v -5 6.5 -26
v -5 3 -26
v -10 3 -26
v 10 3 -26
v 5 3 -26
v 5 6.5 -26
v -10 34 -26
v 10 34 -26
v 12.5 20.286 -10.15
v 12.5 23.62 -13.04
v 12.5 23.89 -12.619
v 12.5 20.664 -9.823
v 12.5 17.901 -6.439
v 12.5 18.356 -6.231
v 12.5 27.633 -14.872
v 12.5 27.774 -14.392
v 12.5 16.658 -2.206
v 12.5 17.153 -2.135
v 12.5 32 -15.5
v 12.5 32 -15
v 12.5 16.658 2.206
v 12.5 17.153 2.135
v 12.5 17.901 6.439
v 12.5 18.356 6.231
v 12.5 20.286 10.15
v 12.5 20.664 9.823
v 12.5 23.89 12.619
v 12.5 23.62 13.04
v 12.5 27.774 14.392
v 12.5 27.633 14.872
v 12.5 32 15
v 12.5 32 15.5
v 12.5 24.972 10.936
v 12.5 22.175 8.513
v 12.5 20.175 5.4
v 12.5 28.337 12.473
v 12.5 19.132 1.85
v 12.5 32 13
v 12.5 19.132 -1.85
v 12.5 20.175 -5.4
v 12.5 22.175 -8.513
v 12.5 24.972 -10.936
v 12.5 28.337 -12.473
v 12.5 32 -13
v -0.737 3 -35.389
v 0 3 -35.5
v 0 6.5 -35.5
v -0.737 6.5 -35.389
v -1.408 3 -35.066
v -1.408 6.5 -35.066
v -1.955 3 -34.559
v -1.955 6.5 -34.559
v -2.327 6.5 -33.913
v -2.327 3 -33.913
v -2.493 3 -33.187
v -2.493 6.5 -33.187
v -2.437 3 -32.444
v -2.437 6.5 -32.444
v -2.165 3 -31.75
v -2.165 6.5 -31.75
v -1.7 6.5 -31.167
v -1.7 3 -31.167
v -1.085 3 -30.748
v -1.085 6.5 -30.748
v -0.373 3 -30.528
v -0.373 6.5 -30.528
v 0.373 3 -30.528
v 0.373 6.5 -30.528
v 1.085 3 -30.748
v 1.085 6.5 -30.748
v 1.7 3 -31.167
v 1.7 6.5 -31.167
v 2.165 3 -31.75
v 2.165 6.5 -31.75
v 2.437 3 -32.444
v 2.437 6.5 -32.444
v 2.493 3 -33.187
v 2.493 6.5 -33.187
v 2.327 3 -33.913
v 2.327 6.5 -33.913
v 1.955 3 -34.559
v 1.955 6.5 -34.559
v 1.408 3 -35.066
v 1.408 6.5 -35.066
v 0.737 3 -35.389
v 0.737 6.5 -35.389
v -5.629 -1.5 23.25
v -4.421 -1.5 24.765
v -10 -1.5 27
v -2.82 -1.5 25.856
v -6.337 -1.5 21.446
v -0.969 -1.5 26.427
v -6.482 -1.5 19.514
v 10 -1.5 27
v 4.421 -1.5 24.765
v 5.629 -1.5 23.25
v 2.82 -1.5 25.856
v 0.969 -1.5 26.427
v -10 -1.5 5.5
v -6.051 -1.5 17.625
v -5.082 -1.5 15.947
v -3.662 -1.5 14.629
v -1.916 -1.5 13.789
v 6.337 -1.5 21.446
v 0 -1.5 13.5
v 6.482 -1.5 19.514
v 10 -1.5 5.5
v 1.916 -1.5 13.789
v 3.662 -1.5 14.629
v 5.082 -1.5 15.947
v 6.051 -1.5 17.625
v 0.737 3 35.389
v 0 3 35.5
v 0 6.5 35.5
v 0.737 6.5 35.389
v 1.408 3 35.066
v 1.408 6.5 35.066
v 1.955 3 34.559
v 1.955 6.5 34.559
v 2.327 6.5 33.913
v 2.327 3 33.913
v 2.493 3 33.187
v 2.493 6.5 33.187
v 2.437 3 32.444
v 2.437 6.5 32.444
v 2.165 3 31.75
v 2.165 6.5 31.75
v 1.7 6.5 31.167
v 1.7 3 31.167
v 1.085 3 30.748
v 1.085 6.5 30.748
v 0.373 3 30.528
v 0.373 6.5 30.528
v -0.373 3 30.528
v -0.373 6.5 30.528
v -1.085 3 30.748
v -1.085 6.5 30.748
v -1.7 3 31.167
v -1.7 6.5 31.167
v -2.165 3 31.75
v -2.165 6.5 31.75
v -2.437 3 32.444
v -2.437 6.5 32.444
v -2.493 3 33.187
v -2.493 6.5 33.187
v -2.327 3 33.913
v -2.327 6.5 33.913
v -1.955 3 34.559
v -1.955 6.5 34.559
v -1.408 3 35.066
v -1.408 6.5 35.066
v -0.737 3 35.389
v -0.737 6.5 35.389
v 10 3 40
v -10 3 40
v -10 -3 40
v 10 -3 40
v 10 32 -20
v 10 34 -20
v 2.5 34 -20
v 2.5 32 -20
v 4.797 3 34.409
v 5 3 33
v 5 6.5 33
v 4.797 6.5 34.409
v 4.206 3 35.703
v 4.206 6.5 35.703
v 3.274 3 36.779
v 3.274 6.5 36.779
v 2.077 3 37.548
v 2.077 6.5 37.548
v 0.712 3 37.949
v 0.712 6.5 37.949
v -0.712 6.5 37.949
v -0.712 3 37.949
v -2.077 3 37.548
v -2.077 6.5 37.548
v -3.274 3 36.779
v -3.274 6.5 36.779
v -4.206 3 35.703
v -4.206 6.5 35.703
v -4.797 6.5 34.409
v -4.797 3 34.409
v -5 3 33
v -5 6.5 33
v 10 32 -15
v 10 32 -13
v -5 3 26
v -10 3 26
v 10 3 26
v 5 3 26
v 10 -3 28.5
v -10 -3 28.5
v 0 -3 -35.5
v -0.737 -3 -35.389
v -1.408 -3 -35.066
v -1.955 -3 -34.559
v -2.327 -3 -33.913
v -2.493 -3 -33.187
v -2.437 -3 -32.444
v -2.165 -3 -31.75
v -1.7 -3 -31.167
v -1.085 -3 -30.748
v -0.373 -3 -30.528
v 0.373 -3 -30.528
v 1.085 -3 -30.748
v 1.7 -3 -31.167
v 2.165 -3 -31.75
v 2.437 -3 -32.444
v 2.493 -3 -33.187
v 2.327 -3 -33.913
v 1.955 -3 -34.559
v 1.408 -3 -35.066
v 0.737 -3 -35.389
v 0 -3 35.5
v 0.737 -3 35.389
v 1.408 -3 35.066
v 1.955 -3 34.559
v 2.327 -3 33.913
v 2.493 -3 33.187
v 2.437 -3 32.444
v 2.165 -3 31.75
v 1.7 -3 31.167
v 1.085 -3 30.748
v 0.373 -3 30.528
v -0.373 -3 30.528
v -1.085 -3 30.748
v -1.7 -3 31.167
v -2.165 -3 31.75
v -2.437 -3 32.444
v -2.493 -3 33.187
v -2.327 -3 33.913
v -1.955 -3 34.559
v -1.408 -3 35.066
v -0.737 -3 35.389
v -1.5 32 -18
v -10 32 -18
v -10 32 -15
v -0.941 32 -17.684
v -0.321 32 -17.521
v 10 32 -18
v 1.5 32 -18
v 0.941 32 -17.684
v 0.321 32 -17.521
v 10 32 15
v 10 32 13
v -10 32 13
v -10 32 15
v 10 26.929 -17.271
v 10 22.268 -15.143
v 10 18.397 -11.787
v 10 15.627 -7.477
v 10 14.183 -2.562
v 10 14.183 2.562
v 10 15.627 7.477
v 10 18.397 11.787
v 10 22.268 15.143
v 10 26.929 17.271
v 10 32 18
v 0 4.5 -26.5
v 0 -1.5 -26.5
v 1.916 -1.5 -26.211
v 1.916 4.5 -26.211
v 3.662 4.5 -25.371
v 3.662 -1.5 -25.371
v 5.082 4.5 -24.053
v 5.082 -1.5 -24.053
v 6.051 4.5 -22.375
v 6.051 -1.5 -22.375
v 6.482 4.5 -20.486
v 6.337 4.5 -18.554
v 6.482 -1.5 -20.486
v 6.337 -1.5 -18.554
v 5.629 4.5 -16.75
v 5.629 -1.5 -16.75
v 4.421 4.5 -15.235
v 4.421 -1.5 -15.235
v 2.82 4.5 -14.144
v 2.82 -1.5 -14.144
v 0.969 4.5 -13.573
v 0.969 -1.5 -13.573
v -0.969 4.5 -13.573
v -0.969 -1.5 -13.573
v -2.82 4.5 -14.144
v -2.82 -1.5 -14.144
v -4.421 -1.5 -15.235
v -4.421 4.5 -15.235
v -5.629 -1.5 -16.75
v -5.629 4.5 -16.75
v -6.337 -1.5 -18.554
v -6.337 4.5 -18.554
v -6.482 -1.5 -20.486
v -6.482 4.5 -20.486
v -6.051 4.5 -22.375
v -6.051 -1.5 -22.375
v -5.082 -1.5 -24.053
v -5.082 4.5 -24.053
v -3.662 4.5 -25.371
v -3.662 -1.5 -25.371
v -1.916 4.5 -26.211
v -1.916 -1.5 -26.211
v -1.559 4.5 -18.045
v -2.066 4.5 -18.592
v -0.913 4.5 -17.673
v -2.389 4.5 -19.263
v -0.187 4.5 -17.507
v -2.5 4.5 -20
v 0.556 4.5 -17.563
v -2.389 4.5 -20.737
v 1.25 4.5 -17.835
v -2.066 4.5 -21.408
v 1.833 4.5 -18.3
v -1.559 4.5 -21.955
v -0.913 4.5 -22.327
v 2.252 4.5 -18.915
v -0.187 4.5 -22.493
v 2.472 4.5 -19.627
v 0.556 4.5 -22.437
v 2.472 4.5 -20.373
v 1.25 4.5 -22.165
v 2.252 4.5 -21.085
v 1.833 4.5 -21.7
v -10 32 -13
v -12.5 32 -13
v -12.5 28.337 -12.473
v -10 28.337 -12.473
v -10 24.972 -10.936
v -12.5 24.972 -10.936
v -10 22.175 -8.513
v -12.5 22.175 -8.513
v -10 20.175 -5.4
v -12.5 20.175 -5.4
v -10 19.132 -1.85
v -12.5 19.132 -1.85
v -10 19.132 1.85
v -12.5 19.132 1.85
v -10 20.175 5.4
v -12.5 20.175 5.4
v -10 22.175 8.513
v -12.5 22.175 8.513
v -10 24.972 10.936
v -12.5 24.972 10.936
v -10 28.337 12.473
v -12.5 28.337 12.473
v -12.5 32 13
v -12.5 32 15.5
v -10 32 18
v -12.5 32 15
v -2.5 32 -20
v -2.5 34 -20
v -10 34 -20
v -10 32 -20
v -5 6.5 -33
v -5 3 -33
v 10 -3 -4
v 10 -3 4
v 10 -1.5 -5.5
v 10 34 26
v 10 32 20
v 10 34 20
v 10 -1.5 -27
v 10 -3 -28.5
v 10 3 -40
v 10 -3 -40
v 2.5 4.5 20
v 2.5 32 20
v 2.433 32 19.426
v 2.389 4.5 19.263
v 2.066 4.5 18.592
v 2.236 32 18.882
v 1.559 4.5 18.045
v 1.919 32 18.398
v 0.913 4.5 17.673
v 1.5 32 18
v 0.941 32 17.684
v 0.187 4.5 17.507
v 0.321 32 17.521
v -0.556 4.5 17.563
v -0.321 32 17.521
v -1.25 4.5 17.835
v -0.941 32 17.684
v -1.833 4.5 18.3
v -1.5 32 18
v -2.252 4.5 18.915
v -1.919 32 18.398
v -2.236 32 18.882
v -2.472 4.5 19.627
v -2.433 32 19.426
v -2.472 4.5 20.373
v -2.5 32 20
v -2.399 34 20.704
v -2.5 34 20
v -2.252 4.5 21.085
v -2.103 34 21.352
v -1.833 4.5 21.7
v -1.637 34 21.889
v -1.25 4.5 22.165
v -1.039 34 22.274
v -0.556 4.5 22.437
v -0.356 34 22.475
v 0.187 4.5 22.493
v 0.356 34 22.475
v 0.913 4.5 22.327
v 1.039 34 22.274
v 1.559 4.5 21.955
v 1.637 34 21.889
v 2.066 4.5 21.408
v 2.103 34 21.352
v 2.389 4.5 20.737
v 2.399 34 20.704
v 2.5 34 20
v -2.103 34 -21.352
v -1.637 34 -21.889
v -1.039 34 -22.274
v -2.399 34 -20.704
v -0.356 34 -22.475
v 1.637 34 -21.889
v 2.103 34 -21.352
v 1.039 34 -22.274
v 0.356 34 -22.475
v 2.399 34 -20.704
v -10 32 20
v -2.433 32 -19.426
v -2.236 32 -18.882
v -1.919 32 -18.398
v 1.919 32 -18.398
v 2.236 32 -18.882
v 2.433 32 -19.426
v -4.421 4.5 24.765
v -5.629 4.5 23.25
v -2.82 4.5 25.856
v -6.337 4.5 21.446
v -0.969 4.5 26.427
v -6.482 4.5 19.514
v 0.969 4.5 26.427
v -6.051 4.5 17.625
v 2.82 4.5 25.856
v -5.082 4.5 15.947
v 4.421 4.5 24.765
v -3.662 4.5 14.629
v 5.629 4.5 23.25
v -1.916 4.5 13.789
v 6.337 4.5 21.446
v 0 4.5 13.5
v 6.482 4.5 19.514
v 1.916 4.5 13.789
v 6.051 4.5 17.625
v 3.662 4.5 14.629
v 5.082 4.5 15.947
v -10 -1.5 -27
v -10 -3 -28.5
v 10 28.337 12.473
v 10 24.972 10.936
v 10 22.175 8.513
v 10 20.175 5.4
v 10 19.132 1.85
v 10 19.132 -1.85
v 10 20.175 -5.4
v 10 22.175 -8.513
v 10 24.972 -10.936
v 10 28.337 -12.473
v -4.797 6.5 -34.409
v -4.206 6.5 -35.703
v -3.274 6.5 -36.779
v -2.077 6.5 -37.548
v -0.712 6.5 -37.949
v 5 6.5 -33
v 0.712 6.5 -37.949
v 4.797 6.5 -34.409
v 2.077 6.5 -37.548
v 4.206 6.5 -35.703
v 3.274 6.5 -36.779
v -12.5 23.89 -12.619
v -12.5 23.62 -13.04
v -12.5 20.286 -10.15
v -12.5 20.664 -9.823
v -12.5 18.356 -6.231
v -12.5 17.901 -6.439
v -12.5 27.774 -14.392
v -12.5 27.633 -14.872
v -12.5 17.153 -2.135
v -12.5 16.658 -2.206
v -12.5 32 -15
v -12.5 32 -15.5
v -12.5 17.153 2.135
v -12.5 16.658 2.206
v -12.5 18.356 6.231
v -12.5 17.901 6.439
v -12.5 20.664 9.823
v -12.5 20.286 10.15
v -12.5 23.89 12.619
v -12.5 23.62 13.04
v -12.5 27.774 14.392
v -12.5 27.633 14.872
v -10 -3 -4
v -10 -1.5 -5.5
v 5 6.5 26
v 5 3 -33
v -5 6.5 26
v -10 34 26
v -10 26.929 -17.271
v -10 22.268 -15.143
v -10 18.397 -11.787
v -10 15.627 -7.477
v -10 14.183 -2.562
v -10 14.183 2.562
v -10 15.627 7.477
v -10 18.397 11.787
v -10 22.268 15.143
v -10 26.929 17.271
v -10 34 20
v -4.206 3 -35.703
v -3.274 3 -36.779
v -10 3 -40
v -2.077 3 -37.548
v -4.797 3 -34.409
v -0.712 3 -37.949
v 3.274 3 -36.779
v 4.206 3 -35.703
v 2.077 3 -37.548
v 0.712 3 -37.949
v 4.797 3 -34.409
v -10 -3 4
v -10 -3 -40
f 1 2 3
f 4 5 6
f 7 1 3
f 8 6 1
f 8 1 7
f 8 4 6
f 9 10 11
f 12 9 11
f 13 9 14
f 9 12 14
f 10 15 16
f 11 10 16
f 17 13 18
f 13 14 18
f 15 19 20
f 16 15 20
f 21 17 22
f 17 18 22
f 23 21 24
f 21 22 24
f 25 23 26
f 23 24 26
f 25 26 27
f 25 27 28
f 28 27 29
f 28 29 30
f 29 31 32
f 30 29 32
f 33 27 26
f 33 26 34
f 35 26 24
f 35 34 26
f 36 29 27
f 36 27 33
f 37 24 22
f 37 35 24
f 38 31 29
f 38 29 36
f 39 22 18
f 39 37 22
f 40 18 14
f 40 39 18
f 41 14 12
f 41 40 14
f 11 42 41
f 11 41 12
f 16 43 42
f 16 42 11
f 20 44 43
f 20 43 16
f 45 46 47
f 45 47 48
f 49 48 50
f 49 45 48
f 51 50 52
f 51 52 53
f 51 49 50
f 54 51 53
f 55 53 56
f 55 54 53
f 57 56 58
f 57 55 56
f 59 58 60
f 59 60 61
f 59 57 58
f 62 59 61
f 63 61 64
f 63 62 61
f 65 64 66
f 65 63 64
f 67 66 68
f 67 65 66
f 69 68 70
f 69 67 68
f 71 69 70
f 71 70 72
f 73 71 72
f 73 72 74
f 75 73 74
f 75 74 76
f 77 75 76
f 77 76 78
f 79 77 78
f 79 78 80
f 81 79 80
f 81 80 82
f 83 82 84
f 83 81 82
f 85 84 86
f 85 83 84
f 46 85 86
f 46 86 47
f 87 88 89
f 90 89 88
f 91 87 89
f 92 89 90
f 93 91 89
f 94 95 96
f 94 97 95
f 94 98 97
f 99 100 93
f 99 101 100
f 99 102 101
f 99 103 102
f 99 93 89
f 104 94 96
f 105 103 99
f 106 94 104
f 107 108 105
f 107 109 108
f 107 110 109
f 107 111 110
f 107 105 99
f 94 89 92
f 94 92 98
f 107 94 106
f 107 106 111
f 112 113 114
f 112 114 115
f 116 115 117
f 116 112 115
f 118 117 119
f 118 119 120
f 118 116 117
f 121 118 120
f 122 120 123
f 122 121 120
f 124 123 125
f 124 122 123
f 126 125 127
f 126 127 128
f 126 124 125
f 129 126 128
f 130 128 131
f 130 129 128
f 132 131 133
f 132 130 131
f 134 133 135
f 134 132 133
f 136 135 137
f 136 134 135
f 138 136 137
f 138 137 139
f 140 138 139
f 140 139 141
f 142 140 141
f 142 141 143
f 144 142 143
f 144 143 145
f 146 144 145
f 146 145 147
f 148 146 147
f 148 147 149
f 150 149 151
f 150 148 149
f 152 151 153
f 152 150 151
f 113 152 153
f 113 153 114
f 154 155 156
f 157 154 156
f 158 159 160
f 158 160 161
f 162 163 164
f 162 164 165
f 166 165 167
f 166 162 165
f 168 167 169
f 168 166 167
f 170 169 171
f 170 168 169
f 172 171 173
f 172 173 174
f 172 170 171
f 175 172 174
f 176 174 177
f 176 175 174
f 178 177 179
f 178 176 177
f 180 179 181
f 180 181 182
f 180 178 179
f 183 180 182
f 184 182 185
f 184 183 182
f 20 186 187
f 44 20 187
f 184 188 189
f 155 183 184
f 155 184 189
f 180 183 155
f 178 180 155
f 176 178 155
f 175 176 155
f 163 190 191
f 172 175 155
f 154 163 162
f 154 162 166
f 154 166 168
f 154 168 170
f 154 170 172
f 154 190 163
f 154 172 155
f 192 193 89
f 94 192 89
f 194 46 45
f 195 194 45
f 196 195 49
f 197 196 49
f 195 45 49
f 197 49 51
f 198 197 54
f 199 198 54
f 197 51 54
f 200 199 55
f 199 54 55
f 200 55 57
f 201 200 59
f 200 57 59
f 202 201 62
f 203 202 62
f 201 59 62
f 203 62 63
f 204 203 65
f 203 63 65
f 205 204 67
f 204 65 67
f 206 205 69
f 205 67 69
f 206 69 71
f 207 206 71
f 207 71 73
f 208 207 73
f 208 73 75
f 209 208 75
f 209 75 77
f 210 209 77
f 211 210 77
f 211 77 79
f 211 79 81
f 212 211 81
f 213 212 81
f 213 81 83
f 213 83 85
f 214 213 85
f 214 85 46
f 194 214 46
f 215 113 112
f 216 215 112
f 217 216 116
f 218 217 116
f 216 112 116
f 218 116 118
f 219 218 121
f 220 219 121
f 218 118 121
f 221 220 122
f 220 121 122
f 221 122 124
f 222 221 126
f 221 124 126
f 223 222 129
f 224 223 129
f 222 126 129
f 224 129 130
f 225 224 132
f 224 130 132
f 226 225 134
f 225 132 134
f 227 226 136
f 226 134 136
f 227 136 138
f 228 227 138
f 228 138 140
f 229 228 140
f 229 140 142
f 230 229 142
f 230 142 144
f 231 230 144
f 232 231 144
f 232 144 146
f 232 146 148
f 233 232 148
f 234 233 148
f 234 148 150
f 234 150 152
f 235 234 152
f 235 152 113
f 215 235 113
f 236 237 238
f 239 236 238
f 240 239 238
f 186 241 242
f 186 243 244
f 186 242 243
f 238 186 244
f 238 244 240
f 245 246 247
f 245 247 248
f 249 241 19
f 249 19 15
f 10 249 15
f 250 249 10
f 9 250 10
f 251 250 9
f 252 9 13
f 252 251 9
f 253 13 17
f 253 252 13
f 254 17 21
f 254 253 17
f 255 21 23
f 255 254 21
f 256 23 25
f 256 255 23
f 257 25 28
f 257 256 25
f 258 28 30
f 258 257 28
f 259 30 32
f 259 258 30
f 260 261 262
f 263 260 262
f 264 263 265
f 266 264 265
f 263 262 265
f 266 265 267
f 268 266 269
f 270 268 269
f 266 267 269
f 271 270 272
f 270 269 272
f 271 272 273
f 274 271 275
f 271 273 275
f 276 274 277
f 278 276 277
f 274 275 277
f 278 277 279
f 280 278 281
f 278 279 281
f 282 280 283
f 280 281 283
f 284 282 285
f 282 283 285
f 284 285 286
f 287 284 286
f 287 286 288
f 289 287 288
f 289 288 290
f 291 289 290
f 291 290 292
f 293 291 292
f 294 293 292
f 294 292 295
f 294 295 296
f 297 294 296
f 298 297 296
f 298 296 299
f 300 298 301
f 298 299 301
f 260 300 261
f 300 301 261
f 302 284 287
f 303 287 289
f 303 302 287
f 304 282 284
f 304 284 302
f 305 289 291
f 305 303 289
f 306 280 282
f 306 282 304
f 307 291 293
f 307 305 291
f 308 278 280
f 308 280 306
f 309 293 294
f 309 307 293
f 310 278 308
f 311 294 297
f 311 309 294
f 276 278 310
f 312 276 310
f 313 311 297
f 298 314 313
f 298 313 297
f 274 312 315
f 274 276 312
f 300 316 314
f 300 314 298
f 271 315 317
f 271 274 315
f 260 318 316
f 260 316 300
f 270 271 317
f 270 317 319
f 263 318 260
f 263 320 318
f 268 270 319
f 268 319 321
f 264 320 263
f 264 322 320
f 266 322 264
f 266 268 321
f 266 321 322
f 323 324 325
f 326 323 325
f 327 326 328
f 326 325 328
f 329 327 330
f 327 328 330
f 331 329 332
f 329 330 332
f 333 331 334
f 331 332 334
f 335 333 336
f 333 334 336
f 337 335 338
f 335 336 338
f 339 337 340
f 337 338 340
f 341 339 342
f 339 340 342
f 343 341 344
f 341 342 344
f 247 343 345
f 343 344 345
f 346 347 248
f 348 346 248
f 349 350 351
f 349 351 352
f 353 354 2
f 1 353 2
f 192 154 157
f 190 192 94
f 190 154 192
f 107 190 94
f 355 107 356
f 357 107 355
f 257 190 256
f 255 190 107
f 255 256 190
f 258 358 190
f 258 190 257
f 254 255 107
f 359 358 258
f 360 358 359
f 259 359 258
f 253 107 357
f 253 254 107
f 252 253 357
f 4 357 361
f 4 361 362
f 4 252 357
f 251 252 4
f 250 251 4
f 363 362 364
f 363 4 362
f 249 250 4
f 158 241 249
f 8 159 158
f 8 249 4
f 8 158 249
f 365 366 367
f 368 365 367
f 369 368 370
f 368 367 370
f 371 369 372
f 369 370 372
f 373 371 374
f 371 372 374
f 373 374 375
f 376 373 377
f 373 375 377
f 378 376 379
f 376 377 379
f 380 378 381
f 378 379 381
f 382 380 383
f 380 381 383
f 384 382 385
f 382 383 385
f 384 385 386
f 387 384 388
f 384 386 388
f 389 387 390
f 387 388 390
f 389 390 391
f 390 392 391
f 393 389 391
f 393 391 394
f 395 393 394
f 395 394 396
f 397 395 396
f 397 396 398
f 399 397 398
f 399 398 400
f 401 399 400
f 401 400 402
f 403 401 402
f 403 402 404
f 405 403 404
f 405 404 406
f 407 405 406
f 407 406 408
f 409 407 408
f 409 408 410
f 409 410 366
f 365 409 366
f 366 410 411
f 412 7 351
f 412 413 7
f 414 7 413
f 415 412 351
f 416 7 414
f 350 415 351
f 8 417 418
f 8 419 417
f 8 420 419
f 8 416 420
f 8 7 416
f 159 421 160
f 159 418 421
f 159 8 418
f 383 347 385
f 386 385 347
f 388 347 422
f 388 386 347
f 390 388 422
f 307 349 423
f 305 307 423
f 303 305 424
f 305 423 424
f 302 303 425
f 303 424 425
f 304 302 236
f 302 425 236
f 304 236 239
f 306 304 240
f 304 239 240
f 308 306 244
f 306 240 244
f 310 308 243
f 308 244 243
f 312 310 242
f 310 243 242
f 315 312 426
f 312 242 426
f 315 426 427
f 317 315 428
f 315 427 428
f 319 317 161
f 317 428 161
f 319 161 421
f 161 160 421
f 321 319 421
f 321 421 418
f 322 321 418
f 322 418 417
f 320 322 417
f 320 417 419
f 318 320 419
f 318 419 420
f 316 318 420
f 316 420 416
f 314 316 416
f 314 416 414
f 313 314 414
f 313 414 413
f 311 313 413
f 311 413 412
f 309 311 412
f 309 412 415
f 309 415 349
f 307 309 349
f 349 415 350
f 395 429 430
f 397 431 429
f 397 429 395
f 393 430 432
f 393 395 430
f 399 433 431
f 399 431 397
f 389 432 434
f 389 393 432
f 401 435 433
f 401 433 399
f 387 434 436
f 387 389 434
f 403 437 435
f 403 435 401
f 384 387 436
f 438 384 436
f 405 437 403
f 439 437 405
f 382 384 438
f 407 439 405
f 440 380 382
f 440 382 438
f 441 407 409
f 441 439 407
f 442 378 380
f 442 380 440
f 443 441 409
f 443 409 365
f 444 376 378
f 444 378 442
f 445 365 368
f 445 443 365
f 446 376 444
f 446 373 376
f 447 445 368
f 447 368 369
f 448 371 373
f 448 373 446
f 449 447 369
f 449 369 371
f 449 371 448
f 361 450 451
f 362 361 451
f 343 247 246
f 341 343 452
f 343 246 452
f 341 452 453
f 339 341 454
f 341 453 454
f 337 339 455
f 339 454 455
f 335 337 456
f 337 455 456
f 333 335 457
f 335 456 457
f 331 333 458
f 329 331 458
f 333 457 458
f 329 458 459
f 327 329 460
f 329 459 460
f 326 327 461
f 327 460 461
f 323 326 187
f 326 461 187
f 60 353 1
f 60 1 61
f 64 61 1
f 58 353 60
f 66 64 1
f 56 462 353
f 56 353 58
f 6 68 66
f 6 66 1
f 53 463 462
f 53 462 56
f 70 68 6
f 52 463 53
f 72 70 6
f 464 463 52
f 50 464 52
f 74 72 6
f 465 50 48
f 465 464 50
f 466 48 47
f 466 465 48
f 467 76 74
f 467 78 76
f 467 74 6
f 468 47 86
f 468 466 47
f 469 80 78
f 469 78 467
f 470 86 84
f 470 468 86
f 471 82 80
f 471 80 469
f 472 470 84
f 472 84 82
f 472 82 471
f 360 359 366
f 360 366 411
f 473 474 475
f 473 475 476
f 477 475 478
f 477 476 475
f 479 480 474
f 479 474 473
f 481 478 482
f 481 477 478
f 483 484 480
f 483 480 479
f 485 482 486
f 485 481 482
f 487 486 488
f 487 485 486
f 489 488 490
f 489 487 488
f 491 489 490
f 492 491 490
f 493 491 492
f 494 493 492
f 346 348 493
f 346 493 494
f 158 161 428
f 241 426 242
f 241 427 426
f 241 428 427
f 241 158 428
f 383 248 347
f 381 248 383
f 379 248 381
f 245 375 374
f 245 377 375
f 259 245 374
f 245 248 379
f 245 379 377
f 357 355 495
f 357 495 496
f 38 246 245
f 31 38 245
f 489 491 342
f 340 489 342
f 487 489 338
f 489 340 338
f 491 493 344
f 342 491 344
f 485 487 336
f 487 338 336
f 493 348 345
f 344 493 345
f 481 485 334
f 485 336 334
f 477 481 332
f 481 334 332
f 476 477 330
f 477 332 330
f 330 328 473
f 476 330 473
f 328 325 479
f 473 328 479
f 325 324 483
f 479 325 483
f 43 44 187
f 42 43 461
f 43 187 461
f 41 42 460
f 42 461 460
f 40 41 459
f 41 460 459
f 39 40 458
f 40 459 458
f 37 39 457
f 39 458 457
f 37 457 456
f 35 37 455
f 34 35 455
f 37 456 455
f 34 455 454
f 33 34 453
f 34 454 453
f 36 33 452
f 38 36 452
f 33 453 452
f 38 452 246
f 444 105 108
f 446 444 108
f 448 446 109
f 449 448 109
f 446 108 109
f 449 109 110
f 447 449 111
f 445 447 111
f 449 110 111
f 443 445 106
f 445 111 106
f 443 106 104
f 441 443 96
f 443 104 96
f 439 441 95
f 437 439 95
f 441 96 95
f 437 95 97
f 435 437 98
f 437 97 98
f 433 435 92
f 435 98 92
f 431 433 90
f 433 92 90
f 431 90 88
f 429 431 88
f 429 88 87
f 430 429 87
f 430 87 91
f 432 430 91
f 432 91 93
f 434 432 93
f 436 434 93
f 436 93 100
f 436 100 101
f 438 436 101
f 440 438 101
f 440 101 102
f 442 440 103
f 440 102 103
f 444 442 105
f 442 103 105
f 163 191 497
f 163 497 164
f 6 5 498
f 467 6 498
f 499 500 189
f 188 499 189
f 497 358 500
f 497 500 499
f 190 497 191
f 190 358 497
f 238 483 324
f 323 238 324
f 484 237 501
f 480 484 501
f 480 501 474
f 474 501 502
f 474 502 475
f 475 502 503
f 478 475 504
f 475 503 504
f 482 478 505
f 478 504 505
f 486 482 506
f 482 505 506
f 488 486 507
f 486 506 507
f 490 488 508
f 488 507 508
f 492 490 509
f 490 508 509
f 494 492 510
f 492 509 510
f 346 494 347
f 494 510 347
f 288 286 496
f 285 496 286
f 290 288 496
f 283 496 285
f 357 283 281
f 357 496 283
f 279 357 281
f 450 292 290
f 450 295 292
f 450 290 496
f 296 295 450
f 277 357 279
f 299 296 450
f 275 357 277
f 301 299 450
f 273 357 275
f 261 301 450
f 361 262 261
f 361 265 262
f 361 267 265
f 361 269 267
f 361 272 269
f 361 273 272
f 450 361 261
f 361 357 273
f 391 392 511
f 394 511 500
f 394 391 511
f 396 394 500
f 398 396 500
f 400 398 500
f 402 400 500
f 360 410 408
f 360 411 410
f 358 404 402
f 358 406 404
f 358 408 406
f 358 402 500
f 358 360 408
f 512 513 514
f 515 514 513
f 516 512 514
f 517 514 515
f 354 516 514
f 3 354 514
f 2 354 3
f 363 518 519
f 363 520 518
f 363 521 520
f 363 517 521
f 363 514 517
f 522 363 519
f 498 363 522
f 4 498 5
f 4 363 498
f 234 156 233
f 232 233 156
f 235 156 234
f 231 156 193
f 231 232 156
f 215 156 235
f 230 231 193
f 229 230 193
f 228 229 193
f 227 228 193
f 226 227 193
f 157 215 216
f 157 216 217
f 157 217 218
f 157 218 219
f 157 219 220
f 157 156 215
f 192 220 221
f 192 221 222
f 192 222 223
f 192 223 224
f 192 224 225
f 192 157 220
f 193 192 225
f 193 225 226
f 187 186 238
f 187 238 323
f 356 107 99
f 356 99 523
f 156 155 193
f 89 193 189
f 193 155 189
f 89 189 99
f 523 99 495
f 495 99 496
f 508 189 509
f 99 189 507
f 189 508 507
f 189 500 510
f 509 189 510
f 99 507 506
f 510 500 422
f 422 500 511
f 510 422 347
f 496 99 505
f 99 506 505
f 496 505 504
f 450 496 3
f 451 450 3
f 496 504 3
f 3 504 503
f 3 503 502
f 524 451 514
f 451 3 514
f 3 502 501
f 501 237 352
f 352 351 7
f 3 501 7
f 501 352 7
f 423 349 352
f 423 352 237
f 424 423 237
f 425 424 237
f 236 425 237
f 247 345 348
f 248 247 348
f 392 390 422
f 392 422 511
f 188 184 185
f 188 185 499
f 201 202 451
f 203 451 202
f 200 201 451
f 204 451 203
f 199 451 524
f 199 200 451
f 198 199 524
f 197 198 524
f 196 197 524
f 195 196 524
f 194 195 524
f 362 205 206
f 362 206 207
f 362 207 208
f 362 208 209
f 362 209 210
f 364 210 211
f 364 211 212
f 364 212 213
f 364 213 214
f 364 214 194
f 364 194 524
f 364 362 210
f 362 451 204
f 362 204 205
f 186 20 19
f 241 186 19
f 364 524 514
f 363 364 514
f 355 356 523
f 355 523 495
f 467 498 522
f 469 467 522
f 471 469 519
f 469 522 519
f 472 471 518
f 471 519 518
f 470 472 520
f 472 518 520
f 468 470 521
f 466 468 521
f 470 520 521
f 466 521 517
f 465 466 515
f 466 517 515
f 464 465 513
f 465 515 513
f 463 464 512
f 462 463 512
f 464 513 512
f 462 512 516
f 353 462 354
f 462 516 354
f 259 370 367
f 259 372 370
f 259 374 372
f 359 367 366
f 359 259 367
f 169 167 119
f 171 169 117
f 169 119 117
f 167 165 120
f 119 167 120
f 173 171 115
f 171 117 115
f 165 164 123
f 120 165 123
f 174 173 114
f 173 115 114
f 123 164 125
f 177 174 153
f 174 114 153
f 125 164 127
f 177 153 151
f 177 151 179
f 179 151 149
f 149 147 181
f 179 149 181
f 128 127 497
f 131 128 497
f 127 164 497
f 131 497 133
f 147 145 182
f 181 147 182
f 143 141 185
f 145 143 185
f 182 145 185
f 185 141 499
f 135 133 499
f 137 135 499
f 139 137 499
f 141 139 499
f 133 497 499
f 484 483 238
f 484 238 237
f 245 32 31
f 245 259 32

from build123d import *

# Parameters (mm, degrees)
BOSS_EXTRUDE1_DEPTH      = 10
BOSS_EXTRUDE2_DEPTH      = 20
SKETCH3_R                = 2.5
BOSS_EXTRUDE4_DEPTH      = 3.5
SKETCH5_R                = 2.5
CUT_EXTRUDE2_DEPTH       = 52.584881506
SKETCH6_R                = 13
CUT_EXTRUDE3_DEPTH       = 57.178287621
BOSS_EXTRUDE5_DEPTH      = 2.5
BOSS_EXTRUDE5_DEPTH_BACK = 22.5
SKETCH14_R               = 6.5
CUT_EXTRUDE6_DEPTH       = 6
BOSS_EXTRUDE6_DEPTH      = 2.5
BOSS_EXTRUDE6_DEPTH_BACK = 22.5
CHAMFER1_SIZE            = 2.5
SKETCH15_R               = 2.5
CUT_EXTRUDE7_DEPTH       = 30


with BuildPart() as part:
    # Sketch1 → Boss-Extrude1 (new, symmetric)
    with BuildSketch(Plane(origin=(0, 0, 0), x_dir=(0, 0, -1), z_dir=(1, 0, 0))):
        Polygon((-40, -3), (-28.5, -3), (-27, -1.5), (-5.5, -1.5), (-4, -3), (4, -3), (5.5, -1.5), (27, -1.5), (28.5, -3), (40, -3), (40, 3), (-40, 3), align=None)
    extrude(amount=BOSS_EXTRUDE1_DEPTH, both=True)

    # Sketch2 → Boss-Extrude2 (add)
    with BuildSketch(Plane(origin=(10, 0, 0), x_dir=(0, 0, -1), z_dir=(1, 0, 0))):
        Polygon((20, 32), (13, 32), (-13, 32), (-20, 32), (-20, 34), (-26, 34), (-26, 3), (26, 3), (26, 34), (20, 34), align=None)
    extrude(amount=-BOSS_EXTRUDE2_DEPTH)

    # Sketch3 → Boss-Extrude4 (add)
    # profile 1 of 2: a face of its own
    with BuildSketch(Plane(origin=(0, 3, 0), x_dir=(1, 0, 0), z_dir=(0, 1, 0))):
        with BuildLine():
            Line((-5, -33), (-5, -25))
            Line((-5, -25), (5, -25))
            Line((5, -25), (5, -33))
            ThreePointArc((5, -33), (0, -38), (-5, -33))
        make_face()
        with Locations(Location((0, -33, 0), (0, 0, 270))):
            Circle(SKETCH3_R, mode=Mode.SUBTRACT)
    # profile 2 of 2: a face of its own
    with BuildSketch(Plane(origin=(0, 3, 0), x_dir=(1, 0, 0), z_dir=(0, 1, 0))):
        with BuildLine():
            Line((5, 25), (5, 33))
            ThreePointArc((5, 33), (0, 38), (-5, 33))
            Line((-5, 33), (-5, 25))
            Line((-5, 25), (5, 25))
        make_face()
        with Locations(Location((0, 33, 0), (0, 0, 90))):
            Circle(SKETCH3_R, mode=Mode.SUBTRACT)
    extrude(amount=BOSS_EXTRUDE4_DEPTH)

    # Sketch5 → Cut-Extrude2 (cut, through all)
    with BuildSketch(Plane(origin=(0, 3, 0), x_dir=(1, 0, 0), z_dir=(0, 1, 0))):
        with Locations(Location((0, 33, 0), (0, 0, 90))):
            Circle(SKETCH5_R)
        with Locations(Location((0, -33, 0), (0, 0, 270))):
            Circle(SKETCH5_R)
    extrude(amount=-CUT_EXTRUDE2_DEPTH, mode=Mode.SUBTRACT)

    # Sketch6 → Cut-Extrude3 (cut, through all)
    with BuildSketch(Plane(origin=(10, 0, 0), x_dir=(0, 0, -1), z_dir=(1, 0, 0))):
        with Locations((0, 32)):
            Circle(SKETCH6_R)
    extrude(amount=-CUT_EXTRUDE3_DEPTH, mode=Mode.SUBTRACT)

    # Sketch8 → Boss-Extrude5 (add, two sides: drawn at the far end of the back side and taken through both)
    with BuildSketch(Plane(origin=(10, 0, 0), x_dir=(0, 0, -1), z_dir=(1, 0, 0)).offset(-BOSS_EXTRUDE5_DEPTH_BACK)):
        with BuildLine():
            Line((-13, 32), (-15, 32))
            ThreePointArc((-15, 32), (0, 17), (15, 32))
            Line((15, 32), (13, 32))
            ThreePointArc((13, 32), (0, 19), (-13, 32))
        make_face()
    extrude(amount=BOSS_EXTRUDE5_DEPTH + BOSS_EXTRUDE5_DEPTH_BACK)

    # Sketch14 → Cut-Extrude6 (cut)
    with BuildSketch(Plane.XZ.offset(1.5)):
        with Locations(Location((0, -20, 0), (0, 0, 270))):
            Circle(SKETCH14_R)
        with Locations(Location((0, 20, 0), (0, 0, 270))):
            Circle(SKETCH14_R)
    extrude(amount=-CUT_EXTRUDE6_DEPTH, mode=Mode.SUBTRACT)

    # Sketch10 → Boss-Extrude6 (add, two sides: drawn at the far end of the back side and taken through both)
    with BuildSketch(Plane(origin=(10, 0, 0), x_dir=(0, 0, -1), z_dir=(1, 0, 0)).offset(-BOSS_EXTRUDE6_DEPTH_BACK)):
        with BuildLine():
            Line((-18, 32), (-15, 32))
            ThreePointArc((-15, 32), (0, 17), (15, 32))
            Line((15, 32), (18, 32))
            ThreePointArc((18, 32), (0, 14), (-18, 32))
        make_face()
    extrude(amount=BOSS_EXTRUDE6_DEPTH + BOSS_EXTRUDE6_DEPTH_BACK)

    # Chamfer1
    chamfer1_edges = [part.edges().sort_by_distance(p)[0] for p in [
        (12.5, 14, 0),
        (-12.5, 14, 0),
    ]]
    chamfer(chamfer1_edges, length=CHAMFER1_SIZE - 0.0001)  # a hair under: the kernel refuses the full size

    # Sketch15 → Cut-Extrude7 (cut)
    with BuildSketch(Plane(origin=(0, 34, 0), x_dir=(1, 0, 0), z_dir=(0, 1, 0))):
        with Locations((0, -20)):
            Circle(SKETCH15_R)
        with Locations(Location((0, 20, 0), (0, 0, 180))):
            Circle(SKETCH15_R)
    extrude(amount=-CUT_EXTRUDE7_DEPTH, mode=Mode.SUBTRACT)


solid = part.part
